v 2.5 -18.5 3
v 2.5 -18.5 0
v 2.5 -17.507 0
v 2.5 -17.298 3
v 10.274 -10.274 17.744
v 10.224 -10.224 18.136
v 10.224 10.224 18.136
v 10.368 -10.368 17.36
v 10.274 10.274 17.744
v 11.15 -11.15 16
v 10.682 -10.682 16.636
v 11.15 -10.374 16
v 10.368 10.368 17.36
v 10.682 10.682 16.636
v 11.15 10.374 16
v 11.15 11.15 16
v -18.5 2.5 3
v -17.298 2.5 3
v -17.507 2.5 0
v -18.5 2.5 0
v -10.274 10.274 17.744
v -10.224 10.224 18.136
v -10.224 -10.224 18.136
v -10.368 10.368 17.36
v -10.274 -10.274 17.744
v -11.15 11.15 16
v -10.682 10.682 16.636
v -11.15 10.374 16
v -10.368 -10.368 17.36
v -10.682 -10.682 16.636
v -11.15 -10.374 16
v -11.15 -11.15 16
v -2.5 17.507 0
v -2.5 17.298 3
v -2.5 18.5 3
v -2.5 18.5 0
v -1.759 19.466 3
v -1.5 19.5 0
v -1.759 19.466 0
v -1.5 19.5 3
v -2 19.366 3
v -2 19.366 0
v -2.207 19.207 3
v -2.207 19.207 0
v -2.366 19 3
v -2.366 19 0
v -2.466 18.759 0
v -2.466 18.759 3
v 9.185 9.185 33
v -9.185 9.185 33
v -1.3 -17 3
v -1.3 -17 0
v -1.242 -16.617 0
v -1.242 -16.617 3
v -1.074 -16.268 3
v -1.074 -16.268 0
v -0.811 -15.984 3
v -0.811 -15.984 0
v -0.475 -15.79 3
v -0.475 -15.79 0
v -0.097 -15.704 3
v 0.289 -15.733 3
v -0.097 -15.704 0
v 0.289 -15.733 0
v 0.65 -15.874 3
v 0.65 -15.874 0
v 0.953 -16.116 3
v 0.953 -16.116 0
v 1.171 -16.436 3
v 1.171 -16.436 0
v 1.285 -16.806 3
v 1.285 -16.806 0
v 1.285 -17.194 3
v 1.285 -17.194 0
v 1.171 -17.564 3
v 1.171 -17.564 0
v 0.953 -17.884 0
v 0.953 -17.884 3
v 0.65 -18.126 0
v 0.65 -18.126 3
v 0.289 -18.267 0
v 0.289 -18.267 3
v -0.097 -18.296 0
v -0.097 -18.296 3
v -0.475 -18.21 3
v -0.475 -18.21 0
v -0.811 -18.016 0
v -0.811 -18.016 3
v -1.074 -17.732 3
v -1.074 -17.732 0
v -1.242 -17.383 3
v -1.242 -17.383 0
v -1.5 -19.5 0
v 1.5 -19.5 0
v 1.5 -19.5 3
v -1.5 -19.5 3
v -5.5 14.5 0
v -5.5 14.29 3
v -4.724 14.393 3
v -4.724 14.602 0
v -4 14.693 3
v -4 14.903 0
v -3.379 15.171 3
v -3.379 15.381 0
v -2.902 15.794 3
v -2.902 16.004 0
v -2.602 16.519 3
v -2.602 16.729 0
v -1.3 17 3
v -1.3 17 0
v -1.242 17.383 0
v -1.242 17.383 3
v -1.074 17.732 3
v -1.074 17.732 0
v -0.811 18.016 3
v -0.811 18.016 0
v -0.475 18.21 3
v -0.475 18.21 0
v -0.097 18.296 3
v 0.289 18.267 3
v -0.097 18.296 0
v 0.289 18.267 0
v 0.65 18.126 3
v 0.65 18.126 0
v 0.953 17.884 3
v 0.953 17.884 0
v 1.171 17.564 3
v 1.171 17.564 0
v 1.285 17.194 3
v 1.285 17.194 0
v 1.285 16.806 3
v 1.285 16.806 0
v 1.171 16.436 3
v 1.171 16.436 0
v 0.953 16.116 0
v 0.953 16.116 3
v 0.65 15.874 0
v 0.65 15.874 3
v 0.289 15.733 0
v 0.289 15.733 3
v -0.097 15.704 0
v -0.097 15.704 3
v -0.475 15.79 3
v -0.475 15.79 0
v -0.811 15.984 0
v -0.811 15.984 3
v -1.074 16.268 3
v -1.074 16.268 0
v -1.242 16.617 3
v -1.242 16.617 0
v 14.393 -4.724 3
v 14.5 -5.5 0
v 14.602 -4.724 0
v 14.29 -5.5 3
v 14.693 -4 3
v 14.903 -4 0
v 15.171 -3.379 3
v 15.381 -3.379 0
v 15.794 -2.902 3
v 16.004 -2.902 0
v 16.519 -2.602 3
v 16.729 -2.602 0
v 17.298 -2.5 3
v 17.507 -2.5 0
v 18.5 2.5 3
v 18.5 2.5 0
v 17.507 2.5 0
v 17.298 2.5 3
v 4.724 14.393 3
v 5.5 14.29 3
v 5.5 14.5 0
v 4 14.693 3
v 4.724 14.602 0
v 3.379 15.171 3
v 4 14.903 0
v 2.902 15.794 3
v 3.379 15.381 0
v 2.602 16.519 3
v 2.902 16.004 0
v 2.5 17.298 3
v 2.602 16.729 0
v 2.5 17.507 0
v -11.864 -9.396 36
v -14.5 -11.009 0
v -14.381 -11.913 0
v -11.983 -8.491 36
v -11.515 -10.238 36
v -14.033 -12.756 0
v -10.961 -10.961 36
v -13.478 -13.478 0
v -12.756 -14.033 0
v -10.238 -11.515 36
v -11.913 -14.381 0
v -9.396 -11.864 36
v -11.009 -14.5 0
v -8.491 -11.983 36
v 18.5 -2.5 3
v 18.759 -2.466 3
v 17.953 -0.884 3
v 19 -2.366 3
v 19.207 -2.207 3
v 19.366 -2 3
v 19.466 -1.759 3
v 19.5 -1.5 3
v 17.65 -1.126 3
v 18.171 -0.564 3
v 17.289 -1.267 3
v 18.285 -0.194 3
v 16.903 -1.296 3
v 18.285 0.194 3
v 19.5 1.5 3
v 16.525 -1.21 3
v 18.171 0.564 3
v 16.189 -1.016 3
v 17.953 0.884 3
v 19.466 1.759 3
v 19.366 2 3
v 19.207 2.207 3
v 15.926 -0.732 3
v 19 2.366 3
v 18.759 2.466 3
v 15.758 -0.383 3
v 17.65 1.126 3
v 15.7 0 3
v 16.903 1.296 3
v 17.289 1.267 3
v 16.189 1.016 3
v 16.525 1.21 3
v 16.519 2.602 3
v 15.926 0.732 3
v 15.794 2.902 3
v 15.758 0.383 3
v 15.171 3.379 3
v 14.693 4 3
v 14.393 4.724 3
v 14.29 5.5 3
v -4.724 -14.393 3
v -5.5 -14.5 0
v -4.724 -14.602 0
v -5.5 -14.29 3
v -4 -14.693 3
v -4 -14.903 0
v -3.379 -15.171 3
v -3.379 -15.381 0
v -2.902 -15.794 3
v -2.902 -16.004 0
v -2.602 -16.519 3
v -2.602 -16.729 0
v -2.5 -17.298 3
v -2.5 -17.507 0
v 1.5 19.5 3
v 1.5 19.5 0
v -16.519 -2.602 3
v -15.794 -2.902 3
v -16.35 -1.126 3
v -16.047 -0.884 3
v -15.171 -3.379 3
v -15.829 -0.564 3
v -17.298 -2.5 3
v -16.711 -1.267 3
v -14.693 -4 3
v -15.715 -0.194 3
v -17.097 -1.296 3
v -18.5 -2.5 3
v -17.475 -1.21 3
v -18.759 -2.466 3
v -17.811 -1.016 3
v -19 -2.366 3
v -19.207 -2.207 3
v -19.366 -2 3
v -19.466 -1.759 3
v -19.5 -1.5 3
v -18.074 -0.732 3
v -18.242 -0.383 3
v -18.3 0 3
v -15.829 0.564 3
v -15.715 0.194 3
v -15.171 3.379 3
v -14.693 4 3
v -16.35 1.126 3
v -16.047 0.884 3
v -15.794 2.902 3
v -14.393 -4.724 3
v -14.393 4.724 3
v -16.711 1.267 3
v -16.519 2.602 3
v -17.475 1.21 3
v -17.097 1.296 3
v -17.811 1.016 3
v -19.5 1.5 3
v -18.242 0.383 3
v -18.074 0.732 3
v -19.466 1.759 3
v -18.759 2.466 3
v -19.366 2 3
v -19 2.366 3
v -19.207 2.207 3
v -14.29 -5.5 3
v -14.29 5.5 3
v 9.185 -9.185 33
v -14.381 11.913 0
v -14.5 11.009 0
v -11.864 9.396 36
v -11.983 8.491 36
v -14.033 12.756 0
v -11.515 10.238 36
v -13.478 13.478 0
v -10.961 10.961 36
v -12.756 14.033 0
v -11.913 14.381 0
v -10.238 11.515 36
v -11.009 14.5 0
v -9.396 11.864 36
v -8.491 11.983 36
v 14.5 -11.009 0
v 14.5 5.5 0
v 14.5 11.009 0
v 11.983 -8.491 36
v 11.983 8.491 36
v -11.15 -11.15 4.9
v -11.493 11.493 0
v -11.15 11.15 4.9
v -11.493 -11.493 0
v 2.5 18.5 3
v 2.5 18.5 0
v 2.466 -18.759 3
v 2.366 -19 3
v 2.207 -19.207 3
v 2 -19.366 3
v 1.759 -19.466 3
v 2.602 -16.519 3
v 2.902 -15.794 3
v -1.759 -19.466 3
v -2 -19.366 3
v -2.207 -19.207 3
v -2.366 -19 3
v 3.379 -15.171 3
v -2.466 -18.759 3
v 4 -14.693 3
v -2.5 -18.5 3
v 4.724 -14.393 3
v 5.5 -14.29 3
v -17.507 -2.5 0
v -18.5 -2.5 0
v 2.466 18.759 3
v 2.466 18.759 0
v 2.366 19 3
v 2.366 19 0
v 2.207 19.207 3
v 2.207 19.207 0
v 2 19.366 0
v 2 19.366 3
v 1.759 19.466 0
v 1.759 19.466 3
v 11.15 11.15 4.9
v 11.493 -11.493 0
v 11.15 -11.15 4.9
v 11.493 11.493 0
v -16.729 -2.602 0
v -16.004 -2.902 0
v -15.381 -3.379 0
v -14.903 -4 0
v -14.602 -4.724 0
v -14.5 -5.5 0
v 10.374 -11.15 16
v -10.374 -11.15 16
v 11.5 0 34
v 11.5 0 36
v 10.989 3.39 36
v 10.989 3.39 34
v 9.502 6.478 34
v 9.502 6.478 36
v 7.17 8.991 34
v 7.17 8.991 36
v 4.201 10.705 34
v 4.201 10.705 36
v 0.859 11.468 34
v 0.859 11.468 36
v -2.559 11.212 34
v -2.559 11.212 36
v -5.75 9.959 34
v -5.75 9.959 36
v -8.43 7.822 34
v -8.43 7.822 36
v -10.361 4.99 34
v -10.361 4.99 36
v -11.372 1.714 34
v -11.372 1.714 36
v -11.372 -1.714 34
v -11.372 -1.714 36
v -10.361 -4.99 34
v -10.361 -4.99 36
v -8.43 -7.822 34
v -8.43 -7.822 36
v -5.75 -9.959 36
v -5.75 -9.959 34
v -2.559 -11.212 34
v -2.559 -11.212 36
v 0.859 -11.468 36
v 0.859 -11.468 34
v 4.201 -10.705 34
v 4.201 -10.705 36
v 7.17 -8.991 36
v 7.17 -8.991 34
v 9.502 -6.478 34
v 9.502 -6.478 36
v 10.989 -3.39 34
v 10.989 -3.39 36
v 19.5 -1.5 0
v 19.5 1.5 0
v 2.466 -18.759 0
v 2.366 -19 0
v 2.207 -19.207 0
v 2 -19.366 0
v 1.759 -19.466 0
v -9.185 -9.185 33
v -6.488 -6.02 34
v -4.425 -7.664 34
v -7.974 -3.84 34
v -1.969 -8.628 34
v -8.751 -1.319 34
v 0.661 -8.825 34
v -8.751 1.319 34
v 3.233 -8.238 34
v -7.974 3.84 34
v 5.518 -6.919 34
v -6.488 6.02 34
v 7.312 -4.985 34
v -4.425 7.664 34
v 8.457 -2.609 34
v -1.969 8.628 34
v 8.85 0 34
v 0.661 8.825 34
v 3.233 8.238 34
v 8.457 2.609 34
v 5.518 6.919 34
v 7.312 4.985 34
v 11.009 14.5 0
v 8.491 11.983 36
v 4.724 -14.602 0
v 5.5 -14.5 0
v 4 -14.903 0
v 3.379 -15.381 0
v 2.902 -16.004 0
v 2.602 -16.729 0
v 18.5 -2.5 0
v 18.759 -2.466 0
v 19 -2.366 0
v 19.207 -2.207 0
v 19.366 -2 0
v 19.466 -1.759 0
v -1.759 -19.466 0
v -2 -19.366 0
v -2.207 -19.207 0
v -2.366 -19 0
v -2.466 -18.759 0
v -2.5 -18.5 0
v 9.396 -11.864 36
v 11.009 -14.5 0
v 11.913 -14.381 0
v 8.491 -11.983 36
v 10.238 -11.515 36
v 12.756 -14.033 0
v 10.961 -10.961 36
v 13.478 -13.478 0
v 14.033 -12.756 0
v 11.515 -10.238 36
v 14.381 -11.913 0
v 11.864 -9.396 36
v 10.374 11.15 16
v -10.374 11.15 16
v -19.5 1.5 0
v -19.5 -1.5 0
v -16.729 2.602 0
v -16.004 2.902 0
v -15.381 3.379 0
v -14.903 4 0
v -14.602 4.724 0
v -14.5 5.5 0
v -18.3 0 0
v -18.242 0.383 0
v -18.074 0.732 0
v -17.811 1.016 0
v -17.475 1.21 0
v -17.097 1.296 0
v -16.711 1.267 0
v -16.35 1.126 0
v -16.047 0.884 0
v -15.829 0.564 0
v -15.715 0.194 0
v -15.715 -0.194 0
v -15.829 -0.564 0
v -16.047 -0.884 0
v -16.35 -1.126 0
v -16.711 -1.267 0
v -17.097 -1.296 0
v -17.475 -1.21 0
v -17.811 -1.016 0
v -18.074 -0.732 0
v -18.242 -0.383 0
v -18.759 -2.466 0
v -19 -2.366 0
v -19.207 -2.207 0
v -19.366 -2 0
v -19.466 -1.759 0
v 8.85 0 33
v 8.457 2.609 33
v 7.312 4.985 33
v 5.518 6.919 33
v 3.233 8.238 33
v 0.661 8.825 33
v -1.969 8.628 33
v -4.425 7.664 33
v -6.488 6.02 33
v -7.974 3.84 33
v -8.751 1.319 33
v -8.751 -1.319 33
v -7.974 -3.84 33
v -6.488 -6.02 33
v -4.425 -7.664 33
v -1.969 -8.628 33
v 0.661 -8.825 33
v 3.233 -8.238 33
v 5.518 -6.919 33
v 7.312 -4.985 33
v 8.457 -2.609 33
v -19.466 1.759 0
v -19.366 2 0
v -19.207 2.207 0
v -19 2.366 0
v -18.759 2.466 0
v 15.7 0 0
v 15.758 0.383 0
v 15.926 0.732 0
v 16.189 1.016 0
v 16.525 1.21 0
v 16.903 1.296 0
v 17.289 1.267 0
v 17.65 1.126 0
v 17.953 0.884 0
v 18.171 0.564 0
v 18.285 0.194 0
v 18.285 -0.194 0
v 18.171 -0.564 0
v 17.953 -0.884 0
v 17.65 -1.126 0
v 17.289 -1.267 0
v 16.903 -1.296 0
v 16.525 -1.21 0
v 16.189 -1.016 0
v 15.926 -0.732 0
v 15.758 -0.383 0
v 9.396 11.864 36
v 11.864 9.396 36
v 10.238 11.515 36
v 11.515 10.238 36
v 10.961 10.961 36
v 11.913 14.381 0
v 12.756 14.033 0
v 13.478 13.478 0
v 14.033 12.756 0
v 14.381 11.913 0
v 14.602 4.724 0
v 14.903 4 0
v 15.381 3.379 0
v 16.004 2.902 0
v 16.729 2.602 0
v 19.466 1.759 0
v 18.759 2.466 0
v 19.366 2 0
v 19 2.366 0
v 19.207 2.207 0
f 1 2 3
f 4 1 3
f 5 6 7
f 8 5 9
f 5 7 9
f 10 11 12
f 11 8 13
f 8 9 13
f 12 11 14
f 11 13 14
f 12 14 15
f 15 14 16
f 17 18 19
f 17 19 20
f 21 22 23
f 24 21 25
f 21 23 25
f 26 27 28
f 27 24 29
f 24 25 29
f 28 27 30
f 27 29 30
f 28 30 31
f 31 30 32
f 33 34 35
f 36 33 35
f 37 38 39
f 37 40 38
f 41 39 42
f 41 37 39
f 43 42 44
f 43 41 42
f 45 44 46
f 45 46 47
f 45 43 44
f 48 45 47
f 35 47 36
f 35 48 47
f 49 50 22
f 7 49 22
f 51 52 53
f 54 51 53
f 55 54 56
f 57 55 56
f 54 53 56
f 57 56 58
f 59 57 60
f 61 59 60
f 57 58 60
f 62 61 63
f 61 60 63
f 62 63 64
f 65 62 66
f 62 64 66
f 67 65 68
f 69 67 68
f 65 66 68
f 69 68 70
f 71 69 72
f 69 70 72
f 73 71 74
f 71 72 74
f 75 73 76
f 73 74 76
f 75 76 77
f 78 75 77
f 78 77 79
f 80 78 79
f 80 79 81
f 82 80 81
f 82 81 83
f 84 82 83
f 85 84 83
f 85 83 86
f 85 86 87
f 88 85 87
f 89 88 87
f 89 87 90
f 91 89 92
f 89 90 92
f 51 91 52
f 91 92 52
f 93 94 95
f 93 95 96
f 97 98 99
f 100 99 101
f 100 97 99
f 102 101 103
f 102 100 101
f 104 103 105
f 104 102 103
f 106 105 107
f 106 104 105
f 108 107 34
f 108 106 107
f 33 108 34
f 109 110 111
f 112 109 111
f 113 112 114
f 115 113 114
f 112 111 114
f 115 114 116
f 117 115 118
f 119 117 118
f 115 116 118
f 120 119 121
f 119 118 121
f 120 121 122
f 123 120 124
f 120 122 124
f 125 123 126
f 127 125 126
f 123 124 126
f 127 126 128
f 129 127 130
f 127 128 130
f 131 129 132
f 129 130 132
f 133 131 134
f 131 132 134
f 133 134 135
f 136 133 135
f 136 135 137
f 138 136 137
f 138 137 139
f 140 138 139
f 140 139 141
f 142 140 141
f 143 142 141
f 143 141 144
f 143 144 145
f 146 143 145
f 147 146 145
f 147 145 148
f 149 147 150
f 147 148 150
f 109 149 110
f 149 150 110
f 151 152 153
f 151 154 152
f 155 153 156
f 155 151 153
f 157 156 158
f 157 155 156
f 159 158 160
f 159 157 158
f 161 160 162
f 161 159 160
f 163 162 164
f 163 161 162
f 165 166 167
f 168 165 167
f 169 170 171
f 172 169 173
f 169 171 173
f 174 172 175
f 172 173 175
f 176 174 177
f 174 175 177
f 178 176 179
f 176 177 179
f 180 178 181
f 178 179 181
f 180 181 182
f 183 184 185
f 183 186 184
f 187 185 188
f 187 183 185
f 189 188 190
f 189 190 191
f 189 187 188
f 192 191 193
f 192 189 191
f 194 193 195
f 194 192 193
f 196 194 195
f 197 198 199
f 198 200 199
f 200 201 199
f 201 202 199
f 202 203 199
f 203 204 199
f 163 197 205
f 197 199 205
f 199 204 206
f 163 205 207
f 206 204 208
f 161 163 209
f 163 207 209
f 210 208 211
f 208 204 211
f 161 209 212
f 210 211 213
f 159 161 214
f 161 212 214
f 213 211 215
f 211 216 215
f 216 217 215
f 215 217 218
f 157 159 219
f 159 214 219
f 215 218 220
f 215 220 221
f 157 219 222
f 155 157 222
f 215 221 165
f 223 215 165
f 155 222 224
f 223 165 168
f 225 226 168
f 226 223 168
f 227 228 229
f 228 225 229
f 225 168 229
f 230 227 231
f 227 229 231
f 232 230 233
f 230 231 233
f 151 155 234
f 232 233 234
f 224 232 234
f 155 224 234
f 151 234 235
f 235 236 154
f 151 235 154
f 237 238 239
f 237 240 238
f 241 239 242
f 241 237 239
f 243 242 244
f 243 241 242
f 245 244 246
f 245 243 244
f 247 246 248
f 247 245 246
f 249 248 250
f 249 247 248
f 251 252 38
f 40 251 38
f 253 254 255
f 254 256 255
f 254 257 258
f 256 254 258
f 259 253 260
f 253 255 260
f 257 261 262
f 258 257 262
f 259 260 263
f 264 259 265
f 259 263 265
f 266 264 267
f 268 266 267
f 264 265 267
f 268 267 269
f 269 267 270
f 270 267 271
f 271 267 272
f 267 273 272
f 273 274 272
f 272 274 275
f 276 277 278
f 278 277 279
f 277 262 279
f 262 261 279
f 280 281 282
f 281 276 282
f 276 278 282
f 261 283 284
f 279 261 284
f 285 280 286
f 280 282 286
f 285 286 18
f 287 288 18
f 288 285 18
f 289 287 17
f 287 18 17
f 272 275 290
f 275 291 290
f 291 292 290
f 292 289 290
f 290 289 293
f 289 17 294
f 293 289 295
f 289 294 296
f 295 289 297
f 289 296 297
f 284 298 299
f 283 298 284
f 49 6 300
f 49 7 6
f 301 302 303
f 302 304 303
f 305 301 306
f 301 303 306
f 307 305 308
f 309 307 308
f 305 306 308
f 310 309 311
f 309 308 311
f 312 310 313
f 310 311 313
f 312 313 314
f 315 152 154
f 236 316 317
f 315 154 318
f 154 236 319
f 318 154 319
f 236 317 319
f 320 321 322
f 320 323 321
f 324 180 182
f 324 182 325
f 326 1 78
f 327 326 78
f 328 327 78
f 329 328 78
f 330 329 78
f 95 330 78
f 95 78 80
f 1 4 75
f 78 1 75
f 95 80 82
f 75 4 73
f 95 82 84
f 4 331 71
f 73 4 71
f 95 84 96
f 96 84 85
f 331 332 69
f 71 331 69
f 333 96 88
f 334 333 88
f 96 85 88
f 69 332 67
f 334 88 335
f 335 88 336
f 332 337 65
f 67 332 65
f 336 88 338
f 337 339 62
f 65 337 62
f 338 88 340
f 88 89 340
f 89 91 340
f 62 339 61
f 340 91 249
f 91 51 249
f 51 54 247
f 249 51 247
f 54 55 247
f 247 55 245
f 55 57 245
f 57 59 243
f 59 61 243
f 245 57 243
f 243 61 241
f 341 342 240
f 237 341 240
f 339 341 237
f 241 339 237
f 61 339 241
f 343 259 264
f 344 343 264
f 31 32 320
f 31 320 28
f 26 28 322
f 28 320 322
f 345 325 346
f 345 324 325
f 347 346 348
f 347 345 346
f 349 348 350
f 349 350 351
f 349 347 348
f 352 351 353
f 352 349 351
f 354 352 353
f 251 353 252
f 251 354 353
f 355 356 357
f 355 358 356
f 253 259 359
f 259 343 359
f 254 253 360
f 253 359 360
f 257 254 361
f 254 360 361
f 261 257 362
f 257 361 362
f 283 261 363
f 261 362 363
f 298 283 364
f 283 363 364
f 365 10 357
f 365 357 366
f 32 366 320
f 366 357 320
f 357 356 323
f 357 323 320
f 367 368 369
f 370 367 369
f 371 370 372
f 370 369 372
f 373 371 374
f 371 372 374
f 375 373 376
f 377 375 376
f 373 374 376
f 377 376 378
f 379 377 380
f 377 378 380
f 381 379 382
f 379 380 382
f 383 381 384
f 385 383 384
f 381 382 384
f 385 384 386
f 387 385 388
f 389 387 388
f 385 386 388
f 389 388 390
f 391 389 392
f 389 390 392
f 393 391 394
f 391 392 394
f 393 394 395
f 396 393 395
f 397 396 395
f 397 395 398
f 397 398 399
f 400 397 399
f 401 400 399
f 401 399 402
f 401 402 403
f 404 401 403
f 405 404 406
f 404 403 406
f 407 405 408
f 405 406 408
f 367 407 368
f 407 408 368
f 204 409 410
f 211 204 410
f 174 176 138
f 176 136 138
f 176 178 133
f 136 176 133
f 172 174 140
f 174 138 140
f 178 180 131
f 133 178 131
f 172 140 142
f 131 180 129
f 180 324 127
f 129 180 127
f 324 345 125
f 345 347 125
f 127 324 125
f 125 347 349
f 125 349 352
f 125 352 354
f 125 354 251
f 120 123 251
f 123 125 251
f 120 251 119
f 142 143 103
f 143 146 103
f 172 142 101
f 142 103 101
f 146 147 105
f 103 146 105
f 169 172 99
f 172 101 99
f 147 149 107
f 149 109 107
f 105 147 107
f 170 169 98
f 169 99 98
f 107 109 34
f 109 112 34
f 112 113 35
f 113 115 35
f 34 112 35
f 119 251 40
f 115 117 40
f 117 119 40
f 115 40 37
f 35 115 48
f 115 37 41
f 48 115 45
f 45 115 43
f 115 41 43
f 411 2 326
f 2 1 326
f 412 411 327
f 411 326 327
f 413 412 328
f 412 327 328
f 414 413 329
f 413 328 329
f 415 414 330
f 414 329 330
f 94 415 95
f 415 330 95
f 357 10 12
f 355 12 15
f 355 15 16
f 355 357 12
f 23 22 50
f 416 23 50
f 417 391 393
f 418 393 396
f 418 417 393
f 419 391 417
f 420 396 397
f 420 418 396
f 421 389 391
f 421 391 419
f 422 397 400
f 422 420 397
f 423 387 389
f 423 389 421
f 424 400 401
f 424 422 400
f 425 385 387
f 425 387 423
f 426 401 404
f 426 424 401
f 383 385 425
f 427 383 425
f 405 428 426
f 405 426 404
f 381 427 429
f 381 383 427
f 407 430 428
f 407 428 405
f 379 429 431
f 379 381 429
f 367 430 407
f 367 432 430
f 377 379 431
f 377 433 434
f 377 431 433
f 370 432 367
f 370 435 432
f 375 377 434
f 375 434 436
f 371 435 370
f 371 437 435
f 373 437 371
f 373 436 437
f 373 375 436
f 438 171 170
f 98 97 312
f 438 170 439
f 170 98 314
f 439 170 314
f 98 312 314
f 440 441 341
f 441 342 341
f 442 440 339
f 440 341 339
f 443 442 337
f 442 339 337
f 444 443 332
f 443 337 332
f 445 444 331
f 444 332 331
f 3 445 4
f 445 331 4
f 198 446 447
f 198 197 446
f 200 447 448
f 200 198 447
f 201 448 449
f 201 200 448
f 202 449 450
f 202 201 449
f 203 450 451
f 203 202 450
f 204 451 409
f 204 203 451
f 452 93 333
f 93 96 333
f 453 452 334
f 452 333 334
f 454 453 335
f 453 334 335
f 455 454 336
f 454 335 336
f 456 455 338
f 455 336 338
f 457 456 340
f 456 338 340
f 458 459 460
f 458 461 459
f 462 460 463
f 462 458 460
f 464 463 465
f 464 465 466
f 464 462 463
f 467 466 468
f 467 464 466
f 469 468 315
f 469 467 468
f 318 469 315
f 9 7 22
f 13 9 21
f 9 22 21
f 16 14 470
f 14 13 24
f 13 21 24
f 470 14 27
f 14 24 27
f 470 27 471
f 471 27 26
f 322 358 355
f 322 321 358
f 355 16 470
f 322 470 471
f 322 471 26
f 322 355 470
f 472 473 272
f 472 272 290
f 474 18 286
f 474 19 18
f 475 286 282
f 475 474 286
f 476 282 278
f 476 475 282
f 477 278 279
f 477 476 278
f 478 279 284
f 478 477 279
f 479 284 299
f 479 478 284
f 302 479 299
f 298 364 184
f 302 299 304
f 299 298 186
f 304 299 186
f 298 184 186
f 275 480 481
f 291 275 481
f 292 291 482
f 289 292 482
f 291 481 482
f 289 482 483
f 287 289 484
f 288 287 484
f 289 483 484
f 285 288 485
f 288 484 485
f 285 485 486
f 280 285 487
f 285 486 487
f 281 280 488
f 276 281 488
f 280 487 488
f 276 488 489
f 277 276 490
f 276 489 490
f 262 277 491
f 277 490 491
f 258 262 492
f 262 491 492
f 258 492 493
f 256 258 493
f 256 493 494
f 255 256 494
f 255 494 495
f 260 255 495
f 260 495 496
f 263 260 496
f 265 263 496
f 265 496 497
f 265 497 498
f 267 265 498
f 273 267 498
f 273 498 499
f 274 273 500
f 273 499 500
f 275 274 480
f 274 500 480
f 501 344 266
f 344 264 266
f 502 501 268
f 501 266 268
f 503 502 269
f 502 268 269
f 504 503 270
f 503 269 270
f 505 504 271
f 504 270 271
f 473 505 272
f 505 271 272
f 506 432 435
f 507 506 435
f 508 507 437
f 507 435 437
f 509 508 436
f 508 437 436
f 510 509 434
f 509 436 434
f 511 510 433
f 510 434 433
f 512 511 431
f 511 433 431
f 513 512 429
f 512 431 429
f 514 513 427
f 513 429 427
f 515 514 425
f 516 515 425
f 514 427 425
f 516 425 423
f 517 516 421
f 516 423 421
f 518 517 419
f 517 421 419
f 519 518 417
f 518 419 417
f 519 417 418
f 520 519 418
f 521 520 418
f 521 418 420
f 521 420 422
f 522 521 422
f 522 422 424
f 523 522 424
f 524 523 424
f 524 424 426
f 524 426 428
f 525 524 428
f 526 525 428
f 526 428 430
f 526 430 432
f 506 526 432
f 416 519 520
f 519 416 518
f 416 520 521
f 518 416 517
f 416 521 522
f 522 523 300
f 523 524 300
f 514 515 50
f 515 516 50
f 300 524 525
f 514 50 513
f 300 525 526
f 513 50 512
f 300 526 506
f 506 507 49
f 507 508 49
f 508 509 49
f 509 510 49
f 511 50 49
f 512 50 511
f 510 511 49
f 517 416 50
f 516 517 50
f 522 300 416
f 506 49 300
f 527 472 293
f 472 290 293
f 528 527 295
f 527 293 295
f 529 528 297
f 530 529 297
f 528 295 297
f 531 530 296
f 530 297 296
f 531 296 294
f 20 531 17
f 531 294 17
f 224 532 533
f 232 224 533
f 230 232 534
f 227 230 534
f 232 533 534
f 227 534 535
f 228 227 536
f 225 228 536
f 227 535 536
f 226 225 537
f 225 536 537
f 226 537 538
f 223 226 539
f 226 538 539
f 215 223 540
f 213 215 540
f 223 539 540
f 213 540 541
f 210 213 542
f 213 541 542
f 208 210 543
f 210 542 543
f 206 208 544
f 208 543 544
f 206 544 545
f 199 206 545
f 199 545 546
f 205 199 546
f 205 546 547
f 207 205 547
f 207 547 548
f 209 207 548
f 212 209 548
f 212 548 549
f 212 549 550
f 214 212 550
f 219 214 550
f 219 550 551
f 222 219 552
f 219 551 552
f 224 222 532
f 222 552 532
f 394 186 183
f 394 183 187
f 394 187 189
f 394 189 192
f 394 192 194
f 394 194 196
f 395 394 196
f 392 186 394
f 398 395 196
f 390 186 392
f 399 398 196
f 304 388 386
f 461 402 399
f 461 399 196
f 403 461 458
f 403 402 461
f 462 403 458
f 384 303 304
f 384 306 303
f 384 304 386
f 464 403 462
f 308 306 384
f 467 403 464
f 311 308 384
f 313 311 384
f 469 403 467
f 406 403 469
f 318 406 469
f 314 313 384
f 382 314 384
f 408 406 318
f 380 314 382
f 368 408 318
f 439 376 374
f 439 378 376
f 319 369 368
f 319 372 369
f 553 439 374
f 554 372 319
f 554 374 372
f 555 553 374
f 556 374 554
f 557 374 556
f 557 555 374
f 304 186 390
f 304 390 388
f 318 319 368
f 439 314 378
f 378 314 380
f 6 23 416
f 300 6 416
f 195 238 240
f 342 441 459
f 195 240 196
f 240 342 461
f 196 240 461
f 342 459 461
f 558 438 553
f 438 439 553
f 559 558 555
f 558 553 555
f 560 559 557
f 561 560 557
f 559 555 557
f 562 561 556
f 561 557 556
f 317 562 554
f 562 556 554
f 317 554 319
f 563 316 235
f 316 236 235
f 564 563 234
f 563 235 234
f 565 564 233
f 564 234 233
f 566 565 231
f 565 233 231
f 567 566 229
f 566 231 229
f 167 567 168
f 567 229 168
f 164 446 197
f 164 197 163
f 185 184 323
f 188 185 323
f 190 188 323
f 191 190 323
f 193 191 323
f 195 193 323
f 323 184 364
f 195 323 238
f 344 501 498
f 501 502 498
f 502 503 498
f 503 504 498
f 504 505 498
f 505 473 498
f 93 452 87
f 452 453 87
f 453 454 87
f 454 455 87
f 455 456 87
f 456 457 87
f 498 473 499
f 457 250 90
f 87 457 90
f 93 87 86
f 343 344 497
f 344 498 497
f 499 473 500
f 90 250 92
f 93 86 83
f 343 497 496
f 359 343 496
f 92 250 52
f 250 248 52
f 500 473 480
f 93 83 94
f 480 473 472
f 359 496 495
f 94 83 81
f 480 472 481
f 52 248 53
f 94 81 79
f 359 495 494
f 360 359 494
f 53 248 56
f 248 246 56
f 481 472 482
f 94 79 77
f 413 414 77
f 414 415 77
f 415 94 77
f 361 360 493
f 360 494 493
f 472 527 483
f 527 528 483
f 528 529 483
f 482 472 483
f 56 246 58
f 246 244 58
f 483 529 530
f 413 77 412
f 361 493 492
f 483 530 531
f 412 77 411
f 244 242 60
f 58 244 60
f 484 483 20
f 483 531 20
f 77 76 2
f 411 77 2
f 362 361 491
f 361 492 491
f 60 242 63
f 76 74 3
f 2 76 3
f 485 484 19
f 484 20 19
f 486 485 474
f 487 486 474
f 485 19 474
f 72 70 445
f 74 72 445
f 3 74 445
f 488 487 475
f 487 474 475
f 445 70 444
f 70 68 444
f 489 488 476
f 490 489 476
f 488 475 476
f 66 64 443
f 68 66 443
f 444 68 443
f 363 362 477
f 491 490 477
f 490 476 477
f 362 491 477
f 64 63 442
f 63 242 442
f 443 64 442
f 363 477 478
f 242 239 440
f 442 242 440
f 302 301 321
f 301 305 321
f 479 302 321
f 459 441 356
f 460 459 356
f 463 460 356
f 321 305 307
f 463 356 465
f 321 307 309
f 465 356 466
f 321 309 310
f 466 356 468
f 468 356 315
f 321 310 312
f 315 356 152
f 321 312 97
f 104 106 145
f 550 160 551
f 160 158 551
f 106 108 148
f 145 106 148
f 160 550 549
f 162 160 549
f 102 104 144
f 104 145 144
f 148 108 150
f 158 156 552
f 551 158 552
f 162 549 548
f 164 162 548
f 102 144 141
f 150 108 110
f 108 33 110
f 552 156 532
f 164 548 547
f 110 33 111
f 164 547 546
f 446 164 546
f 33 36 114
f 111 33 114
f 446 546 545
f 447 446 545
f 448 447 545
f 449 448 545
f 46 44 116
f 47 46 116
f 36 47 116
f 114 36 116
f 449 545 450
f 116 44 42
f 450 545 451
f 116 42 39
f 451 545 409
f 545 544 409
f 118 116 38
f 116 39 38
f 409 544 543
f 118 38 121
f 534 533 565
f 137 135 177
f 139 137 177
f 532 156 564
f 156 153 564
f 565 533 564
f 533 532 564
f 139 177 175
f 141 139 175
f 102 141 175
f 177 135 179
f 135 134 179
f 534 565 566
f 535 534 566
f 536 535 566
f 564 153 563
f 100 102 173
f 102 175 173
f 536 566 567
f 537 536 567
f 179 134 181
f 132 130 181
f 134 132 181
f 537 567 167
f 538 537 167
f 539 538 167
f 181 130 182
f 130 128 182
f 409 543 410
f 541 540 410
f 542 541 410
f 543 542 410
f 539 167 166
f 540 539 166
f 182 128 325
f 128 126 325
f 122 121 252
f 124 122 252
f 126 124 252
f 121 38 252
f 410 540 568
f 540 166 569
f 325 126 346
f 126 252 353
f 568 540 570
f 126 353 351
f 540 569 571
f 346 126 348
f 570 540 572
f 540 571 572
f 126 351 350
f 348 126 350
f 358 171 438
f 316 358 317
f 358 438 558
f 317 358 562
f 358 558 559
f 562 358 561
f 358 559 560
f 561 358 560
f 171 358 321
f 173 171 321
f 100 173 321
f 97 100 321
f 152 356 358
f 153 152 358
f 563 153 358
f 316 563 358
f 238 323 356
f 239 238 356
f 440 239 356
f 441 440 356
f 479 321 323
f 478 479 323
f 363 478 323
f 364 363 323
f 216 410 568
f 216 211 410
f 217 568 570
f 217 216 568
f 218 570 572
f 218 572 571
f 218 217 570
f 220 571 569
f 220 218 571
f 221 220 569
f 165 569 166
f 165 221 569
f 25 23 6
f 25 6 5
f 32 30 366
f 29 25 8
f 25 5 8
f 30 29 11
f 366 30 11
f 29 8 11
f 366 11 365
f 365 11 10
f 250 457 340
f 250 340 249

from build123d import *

# Parameters (mm, degrees)
SKETCH_1_W          = 29
SKETCH_1_H          = 29
EXTRUDE_1_DEPTH     = 36
EXTRUDE_1_TAPER     = 4
SHELL_1_T           = -3
SKETCH_3_W          = 22.3
SKETCH_3_H          = 22.3
CUT_EXTRUDE_2_DEPTH = 16
FILLET_1_R          = 3.5
FILLET_2_R          = 3.5
SKETCH_4_R          = 8.85
CUT_EXTRUDE_3_DEPTH = 3
SKETCH_5_R          = 11.5
CUT_EXTRUDE_4_DEPTH = 2
SKETCH_6_W          = 6.3
SKETCH_6_H          = 5
SKETCH_6_R          = 1.3
SKETCH_6_W_2        = 5
SKETCH_6_H_2        = 6.3
EXTRUDE_2_DEPTH     = 3
FILLET_3_R          = 3
FILLET_4_R          = 1


with BuildPart() as part:
    # Эскиз1 → Бобышка-Вытянуть1 (new body)
    with BuildSketch(Plane.XY):
        Rectangle(SKETCH_1_W, SKETCH_1_H)
    extrude(amount=EXTRUDE_1_DEPTH, taper=EXTRUDE_1_TAPER)

    # Оболочка1
    shell_1_openings = [part.faces().sort_by_distance(p)[0] for p in [
        (0, 0, 0),
    ]]
    offset(amount=SHELL_1_T, openings=shell_1_openings, kind=Kind.INTERSECTION)

    # Эскиз3 → Вырез-Вытянуть2 (cut)
    with BuildSketch(Plane(origin=(0, 0, 0), x_dir=(-1, 0, 0), z_dir=(0, 0, -1))):
        Rectangle(SKETCH_3_W, SKETCH_3_H)
    extrude(amount=-CUT_EXTRUDE_2_DEPTH, mode=Mode.SUBTRACT)

    # Скругление1
    # the kernel refuses this fillet: 3.5 mm, written as the material it takes off along each edge
    with BuildSketch(Plane(origin=(-10.373845315, -15.727322236, 16), x_dir=(-1, 0, 0), z_dir=(0, 1, 0))) as fillet_1_piece_1_section:
        with BuildLine():
            CenterArc((3.342098307, 2.380322106), FILLET_1_R, 184, 38.850835044)
            Line((-0.149375869, 2.136174448), (0, 0))
            Line((0, 0), (0.776154685, 0))
        make_face()
    fillet_1_piece_1 = extrude(amount=31.454644473, mode=Mode.PRIVATE)
    fillet_1_piece_1 = split(fillet_1_piece_1, bisect_by=Plane(origin=(-10.373845315, -10.399895149, 15.627470008), z_dir=(0, 0.9975640502598243, -0.06975647374412536)), keep=Keep.TOP, mode=Mode.PRIVATE)
    fillet_1_piece_1 = split(fillet_1_piece_1, bisect_by=Plane(origin=(-10.373845315, 10.24683793, 17.816290213), z_dir=(0, -0.9975640502598243, -0.06975647374412536)), keep=Keep.TOP, mode=Mode.PRIVATE)
    add(fillet_1_piece_1, mode=Mode.SUBTRACT)
    with BuildSketch(Plane(origin=(15.727322236, -10.373845315, 16), x_dir=(0, -1, 0), z_dir=(-1, 0, 0))) as fillet_1_piece_2_section:
        with BuildLine():
            CenterArc((3.342098307, 2.380322106), FILLET_1_R, 184, 38.850835044)
            Line((-0.149375869, 2.136174448), (0, 0))
            Line((0, 0), (0.776154685, 0))
        make_face()
    fillet_1_piece_2 = extrude(amount=31.454644473, mode=Mode.PRIVATE)
    fillet_1_piece_2 = split(fillet_1_piece_2, bisect_by=Plane(origin=(-10.24683793, -10.373845315, 17.816290213), z_dir=(0.9975640502598243, 0, -0.06975647374412536)), keep=Keep.TOP, mode=Mode.PRIVATE)
    fillet_1_piece_2 = split(fillet_1_piece_2, bisect_by=Plane(origin=(10.399895149, -10.373845315, 15.627470008), z_dir=(-0.9975640502598243, 0, -0.06975647374412536)), keep=Keep.TOP, mode=Mode.PRIVATE)
    add(fillet_1_piece_2, mode=Mode.SUBTRACT)
    with BuildSketch(Plane(origin=(10.373845315, 15.727322236, 16), x_dir=(1, 0, 0), z_dir=(0, -1, 0))) as fillet_1_piece_3_section:
        with BuildLine():
            CenterArc((3.342098307, 2.380322106), FILLET_1_R, 184, 38.850835044)
            Line((-0.149375869, 2.136174448), (0, 0))
            Line((0, 0), (0.776154685, 0))
        make_face()
    fillet_1_piece_3 = extrude(amount=31.454644473, mode=Mode.PRIVATE)
    fillet_1_piece_3 = split(fillet_1_piece_3, bisect_by=Plane(origin=(10.373845315, -10.24683793, 17.816290213), z_dir=(0, 0.9975640502598243, -0.06975647374412536)), keep=Keep.TOP, mode=Mode.PRIVATE)
    fillet_1_piece_3 = split(fillet_1_piece_3, bisect_by=Plane(origin=(10.373845315, 10.399895149, 15.627470008), z_dir=(0, -0.9975640502598243, -0.06975647374412536)), keep=Keep.TOP, mode=Mode.PRIVATE)
    add(fillet_1_piece_3, mode=Mode.SUBTRACT)
    with BuildSketch(Plane(origin=(-15.727322236, 10.373845315, 16), x_dir=(0, 1, 0), z_dir=(1, 0, 0))) as fillet_1_piece_4_section:
        with BuildLine():
            CenterArc((3.342098307, 2.380322106), FILLET_1_R, 184, 38.850835044)
            Line((-0.149375869, 2.136174448), (0, 0))
            Line((0, 0), (0.776154685, 0))
        make_face()
    fillet_1_piece_4 = extrude(amount=31.454644473, mode=Mode.PRIVATE)
    fillet_1_piece_4 = split(fillet_1_piece_4, bisect_by=Plane(origin=(-10.399895149, 10.373845315, 15.627470008), z_dir=(0.9975640502598243, 0, -0.06975647374412536)), keep=Keep.TOP, mode=Mode.PRIVATE)
    fillet_1_piece_4 = split(fillet_1_piece_4, bisect_by=Plane(origin=(10.24683793, 10.373845315, 17.816290213), z_dir=(-0.9975640502598243, 0, -0.06975647374412536)), keep=Keep.TOP, mode=Mode.PRIVATE)
    add(fillet_1_piece_4, mode=Mode.SUBTRACT)
    with BuildSketch(Plane(origin=(15.727322236, -10.373845315, 16), x_dir=(0, -1, 0), z_dir=(-1, 0, 0))) as fillet_1_piece_5a_section:
        with BuildLine():
            CenterArc((3.342098307, 2.380322106), FILLET_1_R, 184, 38.850835044)
            Line((-0.149375869, 2.136174448), (0, 0))
            Line((0, 0), (0.776154685, 0))
        make_face()
    fillet_1_piece_5a = extrude(amount=31.454644473, mode=Mode.PRIVATE)
    fillet_1_piece_5a = split(fillet_1_piece_5a, bisect_by=Plane(origin=(-11.15, -10.373845315, 16), z_dir=(1, 0, 0)), keep=Keep.TOP, mode=Mode.PRIVATE)
    fillet_1_piece_5a = split(fillet_1_piece_5a, bisect_by=Plane(origin=(-10.24683793, -10.373845315, 17.816290213), z_dir=(-0.9975640502598243, 0, 0.06975647374412536)), keep=Keep.TOP, mode=Mode.PRIVATE)
    with BuildSketch(Plane(origin=(-10.373845315, -15.727322236, 16), x_dir=(-1, 0, 0), z_dir=(0, 1, 0))) as fillet_1_piece_5b_section:
        with BuildLine():
            CenterArc((3.342098307, 2.380322106), FILLET_1_R, 184, 38.850835044)
            Line((-0.149375869, 2.136174448), (0, 0))
            Line((0, 0), (0.776154685, 0))
        make_face()
    fillet_1_piece_5b = extrude(amount=31.454644473, mode=Mode.PRIVATE)
    fillet_1_piece_5b = split(fillet_1_piece_5b, bisect_by=Plane(origin=(-10.373845315, -11.15, 16), z_dir=(0, 1, 0)), keep=Keep.TOP, mode=Mode.PRIVATE)
    fillet_1_piece_5b = split(fillet_1_piece_5b, bisect_by=Plane(origin=(-10.373845315, -10.399895149, 15.627470008), z_dir=(0, -0.9975640502598243, 0.06975647374412536)), keep=Keep.TOP, mode=Mode.PRIVATE)
    fillet_1_piece_5 = fillet_1_piece_5a & fillet_1_piece_5b
    add(fillet_1_piece_5, mode=Mode.SUBTRACT)
    with BuildSketch(Plane(origin=(-10.373845315, -15.727322236, 16), x_dir=(-1, 0, 0), z_dir=(0, 1, 0))) as fillet_1_piece_6a_section:
        with BuildLine():
            CenterArc((3.342098307, 2.380322106), FILLET_1_R, 184, 38.850835044)
            Line((-0.149375869, 2.136174448), (0, 0))
            Line((0, 0), (0.776154685, 0))
        make_face()
    fillet_1_piece_6a = extrude(amount=31.454644473, mode=Mode.PRIVATE)
    fillet_1_piece_6a = split(fillet_1_piece_6a, bisect_by=Plane(origin=(-10.373845315, 11.15, 16), z_dir=(0, -1, 0)), keep=Keep.TOP, mode=Mode.PRIVATE)
    fillet_1_piece_6a = split(fillet_1_piece_6a, bisect_by=Plane(origin=(-10.373845315, 10.24683793, 17.816290213), z_dir=(0, 0.9975640502598243, 0.06975647374412536)), keep=Keep.TOP, mode=Mode.PRIVATE)
    with BuildSketch(Plane(origin=(-15.727322236, 10.373845315, 16), x_dir=(0, 1, 0), z_dir=(1, 0, 0))) as fillet_1_piece_6b_section:
        with BuildLine():
            CenterArc((3.342098307, 2.380322106), FILLET_1_R, 184, 38.850835044)
            Line((-0.149375869, 2.136174448), (0, 0))
            Line((0, 0), (0.776154685, 0))
        make_face()
    fillet_1_piece_6b = extrude(amount=31.454644473, mode=Mode.PRIVATE)
    fillet_1_piece_6b = split(fillet_1_piece_6b, bisect_by=Plane(origin=(-11.15, 10.373845315, 16), z_dir=(1, 0, 0)), keep=Keep.TOP, mode=Mode.PRIVATE)
    fillet_1_piece_6b = split(fillet_1_piece_6b, bisect_by=Plane(origin=(-10.399895149, 10.373845315, 15.627470008), z_dir=(-0.9975640502598243, 0, 0.06975647374412536)), keep=Keep.TOP, mode=Mode.PRIVATE)
    fillet_1_piece_6 = fillet_1_piece_6a & fillet_1_piece_6b
    add(fillet_1_piece_6, mode=Mode.SUBTRACT)
    with BuildSketch(Plane(origin=(15.727322236, -10.373845315, 16), x_dir=(0, -1, 0), z_dir=(-1, 0, 0))) as fillet_1_piece_7a_section:
        with BuildLine():
            CenterArc((3.342098307, 2.380322106), FILLET_1_R, 184, 38.850835044)
            Line((-0.149375869, 2.136174448), (0, 0))
            Line((0, 0), (0.776154685, 0))
        make_face()
    fillet_1_piece_7a = extrude(amount=31.454644473, mode=Mode.PRIVATE)
    fillet_1_piece_7a = split(fillet_1_piece_7a, bisect_by=Plane(origin=(11.15, -10.373845315, 16), z_dir=(-1, 0, 0)), keep=Keep.TOP, mode=Mode.PRIVATE)
    fillet_1_piece_7a = split(fillet_1_piece_7a, bisect_by=Plane(origin=(10.399895149, -10.373845315, 15.627470008), z_dir=(0.9975640502598243, 0, 0.06975647374412536)), keep=Keep.TOP, mode=Mode.PRIVATE)
    with BuildSketch(Plane(origin=(10.373845315, 15.727322236, 16), x_dir=(1, 0, 0), z_dir=(0, -1, 0))) as fillet_1_piece_7b_section:
        with BuildLine():
            CenterArc((3.342098307, 2.380322106), FILLET_1_R, 184, 38.850835044)
            Line((-0.149375869, 2.136174448), (0, 0))
            Line((0, 0), (0.776154685, 0))
        make_face()
    fillet_1_piece_7b = extrude(amount=31.454644473, mode=Mode.PRIVATE)
    fillet_1_piece_7b = split(fillet_1_piece_7b, bisect_by=Plane(origin=(10.373845315, -11.15, 16), z_dir=(0, 1, 0)), keep=Keep.TOP, mode=Mode.PRIVATE)
    fillet_1_piece_7b = split(fillet_1_piece_7b, bisect_by=Plane(origin=(10.373845315, -10.24683793, 17.816290213), z_dir=(0, -0.9975640502598243, 0.06975647374412536)), keep=Keep.TOP, mode=Mode.PRIVATE)
    fillet_1_piece_7 = fillet_1_piece_7a & fillet_1_piece_7b
    add(fillet_1_piece_7, mode=Mode.SUBTRACT)
    with BuildSketch(Plane(origin=(-15.727322236, 10.373845315, 16), x_dir=(0, 1, 0), z_dir=(1, 0, 0))) as fillet_1_piece_8a_section:
        with BuildLine():
            CenterArc((3.342098307, 2.380322106), FILLET_1_R, 184, 38.850835044)
            Line((-0.149375869, 2.136174448), (0, 0))
            Line((0, 0), (0.776154685, 0))
        make_face()
    fillet_1_piece_8a = extrude(amount=31.454644473, mode=Mode.PRIVATE)
    fillet_1_piece_8a = split(fillet_1_piece_8a, bisect_by=Plane(origin=(11.15, 10.373845315, 16), z_dir=(-1, 0, 0)), keep=Keep.TOP, mode=Mode.PRIVATE)
    fillet_1_piece_8a = split(fillet_1_piece_8a, bisect_by=Plane(origin=(10.24683793, 10.373845315, 17.816290213), z_dir=(0.9975640502598243, 0, 0.06975647374412536)), keep=Keep.TOP, mode=Mode.PRIVATE)
    with BuildSketch(Plane(origin=(10.373845315, 15.727322236, 16), x_dir=(1, 0, 0), z_dir=(0, -1, 0))) as fillet_1_piece_8b_section:
        with BuildLine():
            CenterArc((3.342098307, 2.380322106), FILLET_1_R, 184, 38.850835044)
            Line((-0.149375869, 2.136174448), (0, 0))
            Line((0, 0), (0.776154685, 0))
        make_face()
    fillet_1_piece_8b = extrude(amount=31.454644473, mode=Mode.PRIVATE)
    fillet_1_piece_8b = split(fillet_1_piece_8b, bisect_by=Plane(origin=(10.373845315, 11.15, 16), z_dir=(0, -1, 0)), keep=Keep.TOP, mode=Mode.PRIVATE)
    fillet_1_piece_8b = split(fillet_1_piece_8b, bisect_by=Plane(origin=(10.373845315, 10.399895149, 15.627470008), z_dir=(0, 0.9975640502598243, 0.06975647374412536)), keep=Keep.TOP, mode=Mode.PRIVATE)
    fillet_1_piece_8 = fillet_1_piece_8a & fillet_1_piece_8b
    add(fillet_1_piece_8, mode=Mode.SUBTRACT)

    # Скругление2
    fillet_2_edges = [part.edges().sort_by_distance(p)[0] for p in [
        (-13.241317385, -13.241317385, 18),
        (-13.241317385, 13.241317385, 18),
        (13.241316923, 13.241316923, 18.000006606),
        (13.241317385, -13.241317385, 18),
    ]]
    fillet(fillet_2_edges, radius=FILLET_2_R)

    # Эскиз4 → Вырез-Вытянуть3 (cut)
    with BuildSketch(Plane.XY.offset(36)):
        Circle(SKETCH_4_R)
    extrude(amount=-CUT_EXTRUDE_3_DEPTH, mode=Mode.SUBTRACT)

    # Эскиз5 → Вырез-Вытянуть4 (cut)
    with BuildSketch(Plane.XY.offset(36)):
        Circle(SKETCH_5_R)
    extrude(amount=-CUT_EXTRUDE_4_DEPTH, mode=Mode.SUBTRACT)

    # Эскиз6 → Бобышка-Вытянуть2 (add)
    # profile 1 of 4: a face of its own
    with BuildSketch(Plane(origin=(0, 0, 0), x_dir=(-1, 0, 0), z_dir=(0, 0, -1))):
        with Locations((16.35, 0)):
            Rectangle(SKETCH_6_W, SKETCH_6_H)
        with Locations((17, 0)):
            Circle(SKETCH_6_R, mode=Mode.SUBTRACT)
    # profile 2 of 4: a face of its own
    with BuildSketch(Plane(origin=(0, 0, 0), x_dir=(-1, 0, 0), z_dir=(0, 0, -1))):
        with Locations((0, -16.35)):
            Rectangle(SKETCH_6_W_2, SKETCH_6_H_2)
        with Locations((0, -17)):
            Circle(SKETCH_6_R, mode=Mode.SUBTRACT)
    # profile 3 of 4: a face of its own
    with BuildSketch(Plane(origin=(0, 0, 0), x_dir=(-1, 0, 0), z_dir=(0, 0, -1))):
        with Locations((-16.35, 0)):
            Rectangle(SKETCH_6_W, SKETCH_6_H)
        with Locations((-17, 0)):
            Circle(SKETCH_6_R, mode=Mode.SUBTRACT)
    # profile 4 of 4: a face of its own
    with BuildSketch(Plane(origin=(0, 0, 0), x_dir=(-1, 0, 0), z_dir=(0, 0, -1))):
        with Locations((0, 16.35)):
            Rectangle(SKETCH_6_W_2, SKETCH_6_H_2)
        with Locations((0, 17)):
            Circle(SKETCH_6_R, mode=Mode.SUBTRACT)
    extrude(amount=-EXTRUDE_2_DEPTH)

    # Скругление3
    fillet_3_edges = [part.edges().sort_by_distance(p)[0] for p in [
        (-14.395109782, -2.5, 1.5),
        (-14.395109782, 2.5, 1.5),
        (-2.5, -14.395109782, 1.5),
        (2.5, -14.395109782, 1.5),
        (14.395109782, -2.5, 1.5),
        (14.395109782, 2.5, 1.5),
        (2.5, 14.395109782, 1.5),
        (-2.5, 14.395109782, 1.5),
    ]]
    fillet(fillet_3_edges, radius=FILLET_3_R)

    # Скругление4
    fillet_4_edges = [part.edges().sort_by_distance(p)[0] for p in [
        (-19.5, -2.5, 1.5),
        (-19.5, 2.5, 1.5),
        (2.5, -19.5, 1.5),
        (-2.5, -19.5, 1.5),
        (19.5, 2.5, 1.5),
        (19.5, -2.5, 1.5),
        (-2.5, 19.5, 1.5),
        (2.5, 19.5, 1.5),
    ]]
    fillet(fillet_4_edges, radius=FILLET_4_R)


solid = part.part
